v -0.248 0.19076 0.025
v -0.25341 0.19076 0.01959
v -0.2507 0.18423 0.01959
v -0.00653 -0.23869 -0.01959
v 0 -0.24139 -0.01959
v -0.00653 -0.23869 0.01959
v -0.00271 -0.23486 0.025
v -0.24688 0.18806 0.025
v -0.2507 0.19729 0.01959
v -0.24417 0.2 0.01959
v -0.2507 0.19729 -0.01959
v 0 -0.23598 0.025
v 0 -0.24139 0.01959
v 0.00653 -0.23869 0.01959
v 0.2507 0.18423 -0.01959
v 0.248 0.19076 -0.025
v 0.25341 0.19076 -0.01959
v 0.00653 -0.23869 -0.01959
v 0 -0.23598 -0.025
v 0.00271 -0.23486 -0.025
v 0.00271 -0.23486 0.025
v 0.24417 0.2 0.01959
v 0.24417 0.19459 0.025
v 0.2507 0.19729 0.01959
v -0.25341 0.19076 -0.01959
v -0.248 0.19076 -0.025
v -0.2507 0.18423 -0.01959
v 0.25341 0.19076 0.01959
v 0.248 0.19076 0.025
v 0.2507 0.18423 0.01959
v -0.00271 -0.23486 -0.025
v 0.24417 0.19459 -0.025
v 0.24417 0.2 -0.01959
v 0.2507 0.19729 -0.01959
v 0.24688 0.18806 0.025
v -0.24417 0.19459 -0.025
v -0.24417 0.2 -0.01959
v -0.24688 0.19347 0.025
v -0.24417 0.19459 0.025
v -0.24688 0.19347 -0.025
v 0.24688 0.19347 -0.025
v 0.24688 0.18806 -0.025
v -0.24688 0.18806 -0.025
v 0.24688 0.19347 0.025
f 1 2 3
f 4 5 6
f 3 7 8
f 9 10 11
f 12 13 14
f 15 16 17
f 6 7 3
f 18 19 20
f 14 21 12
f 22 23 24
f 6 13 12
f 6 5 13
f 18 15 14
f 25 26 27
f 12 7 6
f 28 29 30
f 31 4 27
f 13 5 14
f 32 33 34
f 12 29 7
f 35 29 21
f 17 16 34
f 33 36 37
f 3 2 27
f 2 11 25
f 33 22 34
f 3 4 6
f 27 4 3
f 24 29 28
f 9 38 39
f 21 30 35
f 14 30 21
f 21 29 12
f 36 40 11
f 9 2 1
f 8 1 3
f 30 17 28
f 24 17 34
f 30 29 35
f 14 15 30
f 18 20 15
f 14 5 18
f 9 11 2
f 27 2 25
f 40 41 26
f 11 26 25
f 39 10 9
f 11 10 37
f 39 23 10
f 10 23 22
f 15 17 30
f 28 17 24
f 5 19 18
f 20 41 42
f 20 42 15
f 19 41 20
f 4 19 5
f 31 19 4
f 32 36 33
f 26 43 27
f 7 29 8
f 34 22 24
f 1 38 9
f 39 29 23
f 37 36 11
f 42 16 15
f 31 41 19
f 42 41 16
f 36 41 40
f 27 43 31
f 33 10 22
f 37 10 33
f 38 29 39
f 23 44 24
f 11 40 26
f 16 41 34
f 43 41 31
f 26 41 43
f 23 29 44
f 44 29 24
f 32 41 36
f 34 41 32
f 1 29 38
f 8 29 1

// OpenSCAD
use <lib.scad>

module chevronLD() {
	translate([0,0.05,0]) rotate([0,0,-90]) cyl(0.3,0.3,0.05,$fn=3);
}

module chevronHD() {
	minkowskiOutsideRound(0.01,$fn=8)
	chevronLD();
}

chevronHD();
